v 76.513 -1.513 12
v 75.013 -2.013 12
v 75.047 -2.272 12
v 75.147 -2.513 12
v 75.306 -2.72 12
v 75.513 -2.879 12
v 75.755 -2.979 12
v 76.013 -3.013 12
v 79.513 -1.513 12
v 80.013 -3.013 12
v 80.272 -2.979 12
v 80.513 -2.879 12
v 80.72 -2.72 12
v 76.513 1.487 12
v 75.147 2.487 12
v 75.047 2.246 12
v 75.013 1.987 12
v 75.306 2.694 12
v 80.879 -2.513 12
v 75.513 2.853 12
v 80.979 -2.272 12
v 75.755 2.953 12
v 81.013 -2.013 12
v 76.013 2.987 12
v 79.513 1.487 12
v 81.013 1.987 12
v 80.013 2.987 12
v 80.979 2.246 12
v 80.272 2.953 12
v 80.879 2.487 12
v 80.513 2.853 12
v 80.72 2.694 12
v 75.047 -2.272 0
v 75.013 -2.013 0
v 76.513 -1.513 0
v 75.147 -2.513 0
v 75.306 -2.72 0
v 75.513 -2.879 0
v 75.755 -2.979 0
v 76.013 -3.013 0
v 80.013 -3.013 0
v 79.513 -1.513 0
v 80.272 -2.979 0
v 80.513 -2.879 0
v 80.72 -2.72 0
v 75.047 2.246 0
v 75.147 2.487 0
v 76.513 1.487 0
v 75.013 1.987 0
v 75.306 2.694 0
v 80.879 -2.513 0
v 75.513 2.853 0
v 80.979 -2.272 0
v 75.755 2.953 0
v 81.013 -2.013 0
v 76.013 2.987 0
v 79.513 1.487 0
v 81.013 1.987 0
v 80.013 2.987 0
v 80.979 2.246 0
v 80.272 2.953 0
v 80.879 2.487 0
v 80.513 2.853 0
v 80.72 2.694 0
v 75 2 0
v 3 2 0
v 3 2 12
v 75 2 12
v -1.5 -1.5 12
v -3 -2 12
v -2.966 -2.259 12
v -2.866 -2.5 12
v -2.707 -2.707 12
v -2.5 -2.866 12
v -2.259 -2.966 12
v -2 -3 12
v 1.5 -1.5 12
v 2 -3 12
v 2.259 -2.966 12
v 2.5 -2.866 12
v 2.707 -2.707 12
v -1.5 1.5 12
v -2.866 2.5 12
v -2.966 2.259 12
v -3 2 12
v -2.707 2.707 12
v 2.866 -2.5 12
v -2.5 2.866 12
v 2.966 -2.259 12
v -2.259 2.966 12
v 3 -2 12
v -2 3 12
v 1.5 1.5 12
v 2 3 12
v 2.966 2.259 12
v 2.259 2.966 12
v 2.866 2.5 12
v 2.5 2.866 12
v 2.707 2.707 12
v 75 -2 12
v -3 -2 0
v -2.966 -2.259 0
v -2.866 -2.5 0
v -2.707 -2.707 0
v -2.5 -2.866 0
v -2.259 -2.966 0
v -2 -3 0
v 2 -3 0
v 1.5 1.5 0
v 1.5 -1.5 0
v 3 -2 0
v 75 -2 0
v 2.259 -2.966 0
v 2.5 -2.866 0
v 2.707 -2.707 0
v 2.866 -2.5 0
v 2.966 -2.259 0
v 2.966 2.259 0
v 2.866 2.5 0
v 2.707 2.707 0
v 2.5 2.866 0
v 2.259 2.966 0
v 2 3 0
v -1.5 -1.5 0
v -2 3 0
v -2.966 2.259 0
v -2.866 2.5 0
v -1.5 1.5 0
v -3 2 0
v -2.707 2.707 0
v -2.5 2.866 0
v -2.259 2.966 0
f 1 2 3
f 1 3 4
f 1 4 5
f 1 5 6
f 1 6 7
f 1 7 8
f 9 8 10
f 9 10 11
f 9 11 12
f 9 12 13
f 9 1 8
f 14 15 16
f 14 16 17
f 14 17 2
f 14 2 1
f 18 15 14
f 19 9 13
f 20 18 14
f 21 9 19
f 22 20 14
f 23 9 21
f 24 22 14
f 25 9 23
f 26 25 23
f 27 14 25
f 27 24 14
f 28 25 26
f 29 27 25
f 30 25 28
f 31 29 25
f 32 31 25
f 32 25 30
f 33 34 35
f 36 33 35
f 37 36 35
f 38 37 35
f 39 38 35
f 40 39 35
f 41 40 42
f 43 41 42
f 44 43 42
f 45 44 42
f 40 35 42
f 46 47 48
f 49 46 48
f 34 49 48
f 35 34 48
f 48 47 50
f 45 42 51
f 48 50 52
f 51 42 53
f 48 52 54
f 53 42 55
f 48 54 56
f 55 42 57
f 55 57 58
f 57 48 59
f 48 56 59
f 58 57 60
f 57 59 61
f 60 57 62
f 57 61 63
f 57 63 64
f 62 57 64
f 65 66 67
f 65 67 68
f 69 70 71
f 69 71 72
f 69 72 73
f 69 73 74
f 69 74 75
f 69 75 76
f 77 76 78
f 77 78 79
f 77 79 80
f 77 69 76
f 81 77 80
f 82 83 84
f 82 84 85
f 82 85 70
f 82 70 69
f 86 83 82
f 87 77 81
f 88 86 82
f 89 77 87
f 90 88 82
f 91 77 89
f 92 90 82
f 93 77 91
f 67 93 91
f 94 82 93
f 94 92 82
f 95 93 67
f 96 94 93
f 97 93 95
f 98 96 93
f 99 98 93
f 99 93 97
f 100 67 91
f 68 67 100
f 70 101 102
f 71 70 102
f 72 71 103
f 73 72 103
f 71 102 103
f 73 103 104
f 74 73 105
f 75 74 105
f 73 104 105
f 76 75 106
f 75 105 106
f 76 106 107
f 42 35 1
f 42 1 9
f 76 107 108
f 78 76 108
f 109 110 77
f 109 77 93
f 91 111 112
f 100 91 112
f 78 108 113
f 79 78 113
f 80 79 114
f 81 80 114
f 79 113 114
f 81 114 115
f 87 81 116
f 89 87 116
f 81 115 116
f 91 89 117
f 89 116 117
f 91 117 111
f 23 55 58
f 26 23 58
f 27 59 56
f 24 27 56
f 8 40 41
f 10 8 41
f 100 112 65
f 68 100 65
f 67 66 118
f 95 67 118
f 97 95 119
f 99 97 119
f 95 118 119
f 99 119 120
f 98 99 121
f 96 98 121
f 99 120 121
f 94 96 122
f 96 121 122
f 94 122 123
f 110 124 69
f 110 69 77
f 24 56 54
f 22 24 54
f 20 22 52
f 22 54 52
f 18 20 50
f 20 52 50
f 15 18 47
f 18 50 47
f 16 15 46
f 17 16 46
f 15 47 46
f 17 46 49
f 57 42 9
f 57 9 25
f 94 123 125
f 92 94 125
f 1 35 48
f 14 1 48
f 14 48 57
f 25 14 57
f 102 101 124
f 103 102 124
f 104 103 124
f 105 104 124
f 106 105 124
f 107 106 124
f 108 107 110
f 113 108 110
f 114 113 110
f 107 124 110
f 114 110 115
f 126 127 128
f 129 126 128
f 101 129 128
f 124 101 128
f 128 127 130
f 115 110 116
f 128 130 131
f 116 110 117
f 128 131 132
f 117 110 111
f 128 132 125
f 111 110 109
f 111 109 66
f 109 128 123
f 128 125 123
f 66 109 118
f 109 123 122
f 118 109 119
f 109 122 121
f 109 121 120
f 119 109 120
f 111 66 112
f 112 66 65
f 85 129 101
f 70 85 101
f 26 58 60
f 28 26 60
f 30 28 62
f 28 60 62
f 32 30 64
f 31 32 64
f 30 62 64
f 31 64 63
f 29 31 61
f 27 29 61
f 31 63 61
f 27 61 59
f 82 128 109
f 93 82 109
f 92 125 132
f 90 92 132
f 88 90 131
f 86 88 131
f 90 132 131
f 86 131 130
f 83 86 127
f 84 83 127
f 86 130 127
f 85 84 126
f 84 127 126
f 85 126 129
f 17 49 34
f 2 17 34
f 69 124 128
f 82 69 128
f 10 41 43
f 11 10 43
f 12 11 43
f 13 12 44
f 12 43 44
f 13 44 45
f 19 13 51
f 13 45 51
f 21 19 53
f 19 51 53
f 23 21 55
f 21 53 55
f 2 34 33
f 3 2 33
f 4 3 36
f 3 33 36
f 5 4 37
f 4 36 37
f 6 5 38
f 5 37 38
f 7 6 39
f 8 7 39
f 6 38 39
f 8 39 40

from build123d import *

# Parameters (mm, degrees)
F0_W     = 3
F0_H     = 3
F0_W_2   = 72
F0_H_2   = 4
F1_DEPTH = 12


with BuildPart() as f1:
    # F0 (on Top) → F1 (new body)
    with BuildSketch(Plane.XY):
        with BuildLine():
            Line((2, 3), (-2, 3))
            ThreePointArc((-2, 3), (-2.707107, 2.707107), (-3, 2))
            Line((-3, 2), (-3, -2))
            ThreePointArc((-3, -2), (-2.707107, -2.707107), (-2, -3))
            Line((-2, -3), (2, -3))
            ThreePointArc((2, -3), (2.707107, -2.707107), (3, -2))
            Line((3, -2), (3, 2))
            ThreePointArc((3, 2), (2.707107, 2.707107), (2, 3))
        make_face()
        Rectangle(F0_W, F0_H, mode=Mode.SUBTRACT)
        with Locations((39, 0)):
            Rectangle(F0_W_2, F0_H_2)
        with BuildLine():
            Line((80.013346, 2.987126), (76.013346, 2.987126))
            ThreePointArc((76.013346, 2.987126), (75.306239, 2.694233), (75.013346, 1.987126))
            Line((75.013346, 1.987126), (75.013346, -2.012874))
            ThreePointArc((75.013346, -2.012874), (75.306239, -2.719981), (76.013346, -3.012874))
            Line((76.013346, -3.012874), (80.013346, -3.012874))
            ThreePointArc((80.013346, -3.012874), (80.720453, -2.719981), (81.013346, -2.012874))
            Line((81.013346, -2.012874), (81.013346, 1.987126))
            ThreePointArc((81.013346, 1.987126), (80.720453, 2.694233), (80.013346, 2.987126))
        make_face()
        with Locations((78.013346, -0.012874)):
            Rectangle(F0_W, F0_H, mode=Mode.SUBTRACT)
    extrude(amount=F1_DEPTH)


solid = f1.part
